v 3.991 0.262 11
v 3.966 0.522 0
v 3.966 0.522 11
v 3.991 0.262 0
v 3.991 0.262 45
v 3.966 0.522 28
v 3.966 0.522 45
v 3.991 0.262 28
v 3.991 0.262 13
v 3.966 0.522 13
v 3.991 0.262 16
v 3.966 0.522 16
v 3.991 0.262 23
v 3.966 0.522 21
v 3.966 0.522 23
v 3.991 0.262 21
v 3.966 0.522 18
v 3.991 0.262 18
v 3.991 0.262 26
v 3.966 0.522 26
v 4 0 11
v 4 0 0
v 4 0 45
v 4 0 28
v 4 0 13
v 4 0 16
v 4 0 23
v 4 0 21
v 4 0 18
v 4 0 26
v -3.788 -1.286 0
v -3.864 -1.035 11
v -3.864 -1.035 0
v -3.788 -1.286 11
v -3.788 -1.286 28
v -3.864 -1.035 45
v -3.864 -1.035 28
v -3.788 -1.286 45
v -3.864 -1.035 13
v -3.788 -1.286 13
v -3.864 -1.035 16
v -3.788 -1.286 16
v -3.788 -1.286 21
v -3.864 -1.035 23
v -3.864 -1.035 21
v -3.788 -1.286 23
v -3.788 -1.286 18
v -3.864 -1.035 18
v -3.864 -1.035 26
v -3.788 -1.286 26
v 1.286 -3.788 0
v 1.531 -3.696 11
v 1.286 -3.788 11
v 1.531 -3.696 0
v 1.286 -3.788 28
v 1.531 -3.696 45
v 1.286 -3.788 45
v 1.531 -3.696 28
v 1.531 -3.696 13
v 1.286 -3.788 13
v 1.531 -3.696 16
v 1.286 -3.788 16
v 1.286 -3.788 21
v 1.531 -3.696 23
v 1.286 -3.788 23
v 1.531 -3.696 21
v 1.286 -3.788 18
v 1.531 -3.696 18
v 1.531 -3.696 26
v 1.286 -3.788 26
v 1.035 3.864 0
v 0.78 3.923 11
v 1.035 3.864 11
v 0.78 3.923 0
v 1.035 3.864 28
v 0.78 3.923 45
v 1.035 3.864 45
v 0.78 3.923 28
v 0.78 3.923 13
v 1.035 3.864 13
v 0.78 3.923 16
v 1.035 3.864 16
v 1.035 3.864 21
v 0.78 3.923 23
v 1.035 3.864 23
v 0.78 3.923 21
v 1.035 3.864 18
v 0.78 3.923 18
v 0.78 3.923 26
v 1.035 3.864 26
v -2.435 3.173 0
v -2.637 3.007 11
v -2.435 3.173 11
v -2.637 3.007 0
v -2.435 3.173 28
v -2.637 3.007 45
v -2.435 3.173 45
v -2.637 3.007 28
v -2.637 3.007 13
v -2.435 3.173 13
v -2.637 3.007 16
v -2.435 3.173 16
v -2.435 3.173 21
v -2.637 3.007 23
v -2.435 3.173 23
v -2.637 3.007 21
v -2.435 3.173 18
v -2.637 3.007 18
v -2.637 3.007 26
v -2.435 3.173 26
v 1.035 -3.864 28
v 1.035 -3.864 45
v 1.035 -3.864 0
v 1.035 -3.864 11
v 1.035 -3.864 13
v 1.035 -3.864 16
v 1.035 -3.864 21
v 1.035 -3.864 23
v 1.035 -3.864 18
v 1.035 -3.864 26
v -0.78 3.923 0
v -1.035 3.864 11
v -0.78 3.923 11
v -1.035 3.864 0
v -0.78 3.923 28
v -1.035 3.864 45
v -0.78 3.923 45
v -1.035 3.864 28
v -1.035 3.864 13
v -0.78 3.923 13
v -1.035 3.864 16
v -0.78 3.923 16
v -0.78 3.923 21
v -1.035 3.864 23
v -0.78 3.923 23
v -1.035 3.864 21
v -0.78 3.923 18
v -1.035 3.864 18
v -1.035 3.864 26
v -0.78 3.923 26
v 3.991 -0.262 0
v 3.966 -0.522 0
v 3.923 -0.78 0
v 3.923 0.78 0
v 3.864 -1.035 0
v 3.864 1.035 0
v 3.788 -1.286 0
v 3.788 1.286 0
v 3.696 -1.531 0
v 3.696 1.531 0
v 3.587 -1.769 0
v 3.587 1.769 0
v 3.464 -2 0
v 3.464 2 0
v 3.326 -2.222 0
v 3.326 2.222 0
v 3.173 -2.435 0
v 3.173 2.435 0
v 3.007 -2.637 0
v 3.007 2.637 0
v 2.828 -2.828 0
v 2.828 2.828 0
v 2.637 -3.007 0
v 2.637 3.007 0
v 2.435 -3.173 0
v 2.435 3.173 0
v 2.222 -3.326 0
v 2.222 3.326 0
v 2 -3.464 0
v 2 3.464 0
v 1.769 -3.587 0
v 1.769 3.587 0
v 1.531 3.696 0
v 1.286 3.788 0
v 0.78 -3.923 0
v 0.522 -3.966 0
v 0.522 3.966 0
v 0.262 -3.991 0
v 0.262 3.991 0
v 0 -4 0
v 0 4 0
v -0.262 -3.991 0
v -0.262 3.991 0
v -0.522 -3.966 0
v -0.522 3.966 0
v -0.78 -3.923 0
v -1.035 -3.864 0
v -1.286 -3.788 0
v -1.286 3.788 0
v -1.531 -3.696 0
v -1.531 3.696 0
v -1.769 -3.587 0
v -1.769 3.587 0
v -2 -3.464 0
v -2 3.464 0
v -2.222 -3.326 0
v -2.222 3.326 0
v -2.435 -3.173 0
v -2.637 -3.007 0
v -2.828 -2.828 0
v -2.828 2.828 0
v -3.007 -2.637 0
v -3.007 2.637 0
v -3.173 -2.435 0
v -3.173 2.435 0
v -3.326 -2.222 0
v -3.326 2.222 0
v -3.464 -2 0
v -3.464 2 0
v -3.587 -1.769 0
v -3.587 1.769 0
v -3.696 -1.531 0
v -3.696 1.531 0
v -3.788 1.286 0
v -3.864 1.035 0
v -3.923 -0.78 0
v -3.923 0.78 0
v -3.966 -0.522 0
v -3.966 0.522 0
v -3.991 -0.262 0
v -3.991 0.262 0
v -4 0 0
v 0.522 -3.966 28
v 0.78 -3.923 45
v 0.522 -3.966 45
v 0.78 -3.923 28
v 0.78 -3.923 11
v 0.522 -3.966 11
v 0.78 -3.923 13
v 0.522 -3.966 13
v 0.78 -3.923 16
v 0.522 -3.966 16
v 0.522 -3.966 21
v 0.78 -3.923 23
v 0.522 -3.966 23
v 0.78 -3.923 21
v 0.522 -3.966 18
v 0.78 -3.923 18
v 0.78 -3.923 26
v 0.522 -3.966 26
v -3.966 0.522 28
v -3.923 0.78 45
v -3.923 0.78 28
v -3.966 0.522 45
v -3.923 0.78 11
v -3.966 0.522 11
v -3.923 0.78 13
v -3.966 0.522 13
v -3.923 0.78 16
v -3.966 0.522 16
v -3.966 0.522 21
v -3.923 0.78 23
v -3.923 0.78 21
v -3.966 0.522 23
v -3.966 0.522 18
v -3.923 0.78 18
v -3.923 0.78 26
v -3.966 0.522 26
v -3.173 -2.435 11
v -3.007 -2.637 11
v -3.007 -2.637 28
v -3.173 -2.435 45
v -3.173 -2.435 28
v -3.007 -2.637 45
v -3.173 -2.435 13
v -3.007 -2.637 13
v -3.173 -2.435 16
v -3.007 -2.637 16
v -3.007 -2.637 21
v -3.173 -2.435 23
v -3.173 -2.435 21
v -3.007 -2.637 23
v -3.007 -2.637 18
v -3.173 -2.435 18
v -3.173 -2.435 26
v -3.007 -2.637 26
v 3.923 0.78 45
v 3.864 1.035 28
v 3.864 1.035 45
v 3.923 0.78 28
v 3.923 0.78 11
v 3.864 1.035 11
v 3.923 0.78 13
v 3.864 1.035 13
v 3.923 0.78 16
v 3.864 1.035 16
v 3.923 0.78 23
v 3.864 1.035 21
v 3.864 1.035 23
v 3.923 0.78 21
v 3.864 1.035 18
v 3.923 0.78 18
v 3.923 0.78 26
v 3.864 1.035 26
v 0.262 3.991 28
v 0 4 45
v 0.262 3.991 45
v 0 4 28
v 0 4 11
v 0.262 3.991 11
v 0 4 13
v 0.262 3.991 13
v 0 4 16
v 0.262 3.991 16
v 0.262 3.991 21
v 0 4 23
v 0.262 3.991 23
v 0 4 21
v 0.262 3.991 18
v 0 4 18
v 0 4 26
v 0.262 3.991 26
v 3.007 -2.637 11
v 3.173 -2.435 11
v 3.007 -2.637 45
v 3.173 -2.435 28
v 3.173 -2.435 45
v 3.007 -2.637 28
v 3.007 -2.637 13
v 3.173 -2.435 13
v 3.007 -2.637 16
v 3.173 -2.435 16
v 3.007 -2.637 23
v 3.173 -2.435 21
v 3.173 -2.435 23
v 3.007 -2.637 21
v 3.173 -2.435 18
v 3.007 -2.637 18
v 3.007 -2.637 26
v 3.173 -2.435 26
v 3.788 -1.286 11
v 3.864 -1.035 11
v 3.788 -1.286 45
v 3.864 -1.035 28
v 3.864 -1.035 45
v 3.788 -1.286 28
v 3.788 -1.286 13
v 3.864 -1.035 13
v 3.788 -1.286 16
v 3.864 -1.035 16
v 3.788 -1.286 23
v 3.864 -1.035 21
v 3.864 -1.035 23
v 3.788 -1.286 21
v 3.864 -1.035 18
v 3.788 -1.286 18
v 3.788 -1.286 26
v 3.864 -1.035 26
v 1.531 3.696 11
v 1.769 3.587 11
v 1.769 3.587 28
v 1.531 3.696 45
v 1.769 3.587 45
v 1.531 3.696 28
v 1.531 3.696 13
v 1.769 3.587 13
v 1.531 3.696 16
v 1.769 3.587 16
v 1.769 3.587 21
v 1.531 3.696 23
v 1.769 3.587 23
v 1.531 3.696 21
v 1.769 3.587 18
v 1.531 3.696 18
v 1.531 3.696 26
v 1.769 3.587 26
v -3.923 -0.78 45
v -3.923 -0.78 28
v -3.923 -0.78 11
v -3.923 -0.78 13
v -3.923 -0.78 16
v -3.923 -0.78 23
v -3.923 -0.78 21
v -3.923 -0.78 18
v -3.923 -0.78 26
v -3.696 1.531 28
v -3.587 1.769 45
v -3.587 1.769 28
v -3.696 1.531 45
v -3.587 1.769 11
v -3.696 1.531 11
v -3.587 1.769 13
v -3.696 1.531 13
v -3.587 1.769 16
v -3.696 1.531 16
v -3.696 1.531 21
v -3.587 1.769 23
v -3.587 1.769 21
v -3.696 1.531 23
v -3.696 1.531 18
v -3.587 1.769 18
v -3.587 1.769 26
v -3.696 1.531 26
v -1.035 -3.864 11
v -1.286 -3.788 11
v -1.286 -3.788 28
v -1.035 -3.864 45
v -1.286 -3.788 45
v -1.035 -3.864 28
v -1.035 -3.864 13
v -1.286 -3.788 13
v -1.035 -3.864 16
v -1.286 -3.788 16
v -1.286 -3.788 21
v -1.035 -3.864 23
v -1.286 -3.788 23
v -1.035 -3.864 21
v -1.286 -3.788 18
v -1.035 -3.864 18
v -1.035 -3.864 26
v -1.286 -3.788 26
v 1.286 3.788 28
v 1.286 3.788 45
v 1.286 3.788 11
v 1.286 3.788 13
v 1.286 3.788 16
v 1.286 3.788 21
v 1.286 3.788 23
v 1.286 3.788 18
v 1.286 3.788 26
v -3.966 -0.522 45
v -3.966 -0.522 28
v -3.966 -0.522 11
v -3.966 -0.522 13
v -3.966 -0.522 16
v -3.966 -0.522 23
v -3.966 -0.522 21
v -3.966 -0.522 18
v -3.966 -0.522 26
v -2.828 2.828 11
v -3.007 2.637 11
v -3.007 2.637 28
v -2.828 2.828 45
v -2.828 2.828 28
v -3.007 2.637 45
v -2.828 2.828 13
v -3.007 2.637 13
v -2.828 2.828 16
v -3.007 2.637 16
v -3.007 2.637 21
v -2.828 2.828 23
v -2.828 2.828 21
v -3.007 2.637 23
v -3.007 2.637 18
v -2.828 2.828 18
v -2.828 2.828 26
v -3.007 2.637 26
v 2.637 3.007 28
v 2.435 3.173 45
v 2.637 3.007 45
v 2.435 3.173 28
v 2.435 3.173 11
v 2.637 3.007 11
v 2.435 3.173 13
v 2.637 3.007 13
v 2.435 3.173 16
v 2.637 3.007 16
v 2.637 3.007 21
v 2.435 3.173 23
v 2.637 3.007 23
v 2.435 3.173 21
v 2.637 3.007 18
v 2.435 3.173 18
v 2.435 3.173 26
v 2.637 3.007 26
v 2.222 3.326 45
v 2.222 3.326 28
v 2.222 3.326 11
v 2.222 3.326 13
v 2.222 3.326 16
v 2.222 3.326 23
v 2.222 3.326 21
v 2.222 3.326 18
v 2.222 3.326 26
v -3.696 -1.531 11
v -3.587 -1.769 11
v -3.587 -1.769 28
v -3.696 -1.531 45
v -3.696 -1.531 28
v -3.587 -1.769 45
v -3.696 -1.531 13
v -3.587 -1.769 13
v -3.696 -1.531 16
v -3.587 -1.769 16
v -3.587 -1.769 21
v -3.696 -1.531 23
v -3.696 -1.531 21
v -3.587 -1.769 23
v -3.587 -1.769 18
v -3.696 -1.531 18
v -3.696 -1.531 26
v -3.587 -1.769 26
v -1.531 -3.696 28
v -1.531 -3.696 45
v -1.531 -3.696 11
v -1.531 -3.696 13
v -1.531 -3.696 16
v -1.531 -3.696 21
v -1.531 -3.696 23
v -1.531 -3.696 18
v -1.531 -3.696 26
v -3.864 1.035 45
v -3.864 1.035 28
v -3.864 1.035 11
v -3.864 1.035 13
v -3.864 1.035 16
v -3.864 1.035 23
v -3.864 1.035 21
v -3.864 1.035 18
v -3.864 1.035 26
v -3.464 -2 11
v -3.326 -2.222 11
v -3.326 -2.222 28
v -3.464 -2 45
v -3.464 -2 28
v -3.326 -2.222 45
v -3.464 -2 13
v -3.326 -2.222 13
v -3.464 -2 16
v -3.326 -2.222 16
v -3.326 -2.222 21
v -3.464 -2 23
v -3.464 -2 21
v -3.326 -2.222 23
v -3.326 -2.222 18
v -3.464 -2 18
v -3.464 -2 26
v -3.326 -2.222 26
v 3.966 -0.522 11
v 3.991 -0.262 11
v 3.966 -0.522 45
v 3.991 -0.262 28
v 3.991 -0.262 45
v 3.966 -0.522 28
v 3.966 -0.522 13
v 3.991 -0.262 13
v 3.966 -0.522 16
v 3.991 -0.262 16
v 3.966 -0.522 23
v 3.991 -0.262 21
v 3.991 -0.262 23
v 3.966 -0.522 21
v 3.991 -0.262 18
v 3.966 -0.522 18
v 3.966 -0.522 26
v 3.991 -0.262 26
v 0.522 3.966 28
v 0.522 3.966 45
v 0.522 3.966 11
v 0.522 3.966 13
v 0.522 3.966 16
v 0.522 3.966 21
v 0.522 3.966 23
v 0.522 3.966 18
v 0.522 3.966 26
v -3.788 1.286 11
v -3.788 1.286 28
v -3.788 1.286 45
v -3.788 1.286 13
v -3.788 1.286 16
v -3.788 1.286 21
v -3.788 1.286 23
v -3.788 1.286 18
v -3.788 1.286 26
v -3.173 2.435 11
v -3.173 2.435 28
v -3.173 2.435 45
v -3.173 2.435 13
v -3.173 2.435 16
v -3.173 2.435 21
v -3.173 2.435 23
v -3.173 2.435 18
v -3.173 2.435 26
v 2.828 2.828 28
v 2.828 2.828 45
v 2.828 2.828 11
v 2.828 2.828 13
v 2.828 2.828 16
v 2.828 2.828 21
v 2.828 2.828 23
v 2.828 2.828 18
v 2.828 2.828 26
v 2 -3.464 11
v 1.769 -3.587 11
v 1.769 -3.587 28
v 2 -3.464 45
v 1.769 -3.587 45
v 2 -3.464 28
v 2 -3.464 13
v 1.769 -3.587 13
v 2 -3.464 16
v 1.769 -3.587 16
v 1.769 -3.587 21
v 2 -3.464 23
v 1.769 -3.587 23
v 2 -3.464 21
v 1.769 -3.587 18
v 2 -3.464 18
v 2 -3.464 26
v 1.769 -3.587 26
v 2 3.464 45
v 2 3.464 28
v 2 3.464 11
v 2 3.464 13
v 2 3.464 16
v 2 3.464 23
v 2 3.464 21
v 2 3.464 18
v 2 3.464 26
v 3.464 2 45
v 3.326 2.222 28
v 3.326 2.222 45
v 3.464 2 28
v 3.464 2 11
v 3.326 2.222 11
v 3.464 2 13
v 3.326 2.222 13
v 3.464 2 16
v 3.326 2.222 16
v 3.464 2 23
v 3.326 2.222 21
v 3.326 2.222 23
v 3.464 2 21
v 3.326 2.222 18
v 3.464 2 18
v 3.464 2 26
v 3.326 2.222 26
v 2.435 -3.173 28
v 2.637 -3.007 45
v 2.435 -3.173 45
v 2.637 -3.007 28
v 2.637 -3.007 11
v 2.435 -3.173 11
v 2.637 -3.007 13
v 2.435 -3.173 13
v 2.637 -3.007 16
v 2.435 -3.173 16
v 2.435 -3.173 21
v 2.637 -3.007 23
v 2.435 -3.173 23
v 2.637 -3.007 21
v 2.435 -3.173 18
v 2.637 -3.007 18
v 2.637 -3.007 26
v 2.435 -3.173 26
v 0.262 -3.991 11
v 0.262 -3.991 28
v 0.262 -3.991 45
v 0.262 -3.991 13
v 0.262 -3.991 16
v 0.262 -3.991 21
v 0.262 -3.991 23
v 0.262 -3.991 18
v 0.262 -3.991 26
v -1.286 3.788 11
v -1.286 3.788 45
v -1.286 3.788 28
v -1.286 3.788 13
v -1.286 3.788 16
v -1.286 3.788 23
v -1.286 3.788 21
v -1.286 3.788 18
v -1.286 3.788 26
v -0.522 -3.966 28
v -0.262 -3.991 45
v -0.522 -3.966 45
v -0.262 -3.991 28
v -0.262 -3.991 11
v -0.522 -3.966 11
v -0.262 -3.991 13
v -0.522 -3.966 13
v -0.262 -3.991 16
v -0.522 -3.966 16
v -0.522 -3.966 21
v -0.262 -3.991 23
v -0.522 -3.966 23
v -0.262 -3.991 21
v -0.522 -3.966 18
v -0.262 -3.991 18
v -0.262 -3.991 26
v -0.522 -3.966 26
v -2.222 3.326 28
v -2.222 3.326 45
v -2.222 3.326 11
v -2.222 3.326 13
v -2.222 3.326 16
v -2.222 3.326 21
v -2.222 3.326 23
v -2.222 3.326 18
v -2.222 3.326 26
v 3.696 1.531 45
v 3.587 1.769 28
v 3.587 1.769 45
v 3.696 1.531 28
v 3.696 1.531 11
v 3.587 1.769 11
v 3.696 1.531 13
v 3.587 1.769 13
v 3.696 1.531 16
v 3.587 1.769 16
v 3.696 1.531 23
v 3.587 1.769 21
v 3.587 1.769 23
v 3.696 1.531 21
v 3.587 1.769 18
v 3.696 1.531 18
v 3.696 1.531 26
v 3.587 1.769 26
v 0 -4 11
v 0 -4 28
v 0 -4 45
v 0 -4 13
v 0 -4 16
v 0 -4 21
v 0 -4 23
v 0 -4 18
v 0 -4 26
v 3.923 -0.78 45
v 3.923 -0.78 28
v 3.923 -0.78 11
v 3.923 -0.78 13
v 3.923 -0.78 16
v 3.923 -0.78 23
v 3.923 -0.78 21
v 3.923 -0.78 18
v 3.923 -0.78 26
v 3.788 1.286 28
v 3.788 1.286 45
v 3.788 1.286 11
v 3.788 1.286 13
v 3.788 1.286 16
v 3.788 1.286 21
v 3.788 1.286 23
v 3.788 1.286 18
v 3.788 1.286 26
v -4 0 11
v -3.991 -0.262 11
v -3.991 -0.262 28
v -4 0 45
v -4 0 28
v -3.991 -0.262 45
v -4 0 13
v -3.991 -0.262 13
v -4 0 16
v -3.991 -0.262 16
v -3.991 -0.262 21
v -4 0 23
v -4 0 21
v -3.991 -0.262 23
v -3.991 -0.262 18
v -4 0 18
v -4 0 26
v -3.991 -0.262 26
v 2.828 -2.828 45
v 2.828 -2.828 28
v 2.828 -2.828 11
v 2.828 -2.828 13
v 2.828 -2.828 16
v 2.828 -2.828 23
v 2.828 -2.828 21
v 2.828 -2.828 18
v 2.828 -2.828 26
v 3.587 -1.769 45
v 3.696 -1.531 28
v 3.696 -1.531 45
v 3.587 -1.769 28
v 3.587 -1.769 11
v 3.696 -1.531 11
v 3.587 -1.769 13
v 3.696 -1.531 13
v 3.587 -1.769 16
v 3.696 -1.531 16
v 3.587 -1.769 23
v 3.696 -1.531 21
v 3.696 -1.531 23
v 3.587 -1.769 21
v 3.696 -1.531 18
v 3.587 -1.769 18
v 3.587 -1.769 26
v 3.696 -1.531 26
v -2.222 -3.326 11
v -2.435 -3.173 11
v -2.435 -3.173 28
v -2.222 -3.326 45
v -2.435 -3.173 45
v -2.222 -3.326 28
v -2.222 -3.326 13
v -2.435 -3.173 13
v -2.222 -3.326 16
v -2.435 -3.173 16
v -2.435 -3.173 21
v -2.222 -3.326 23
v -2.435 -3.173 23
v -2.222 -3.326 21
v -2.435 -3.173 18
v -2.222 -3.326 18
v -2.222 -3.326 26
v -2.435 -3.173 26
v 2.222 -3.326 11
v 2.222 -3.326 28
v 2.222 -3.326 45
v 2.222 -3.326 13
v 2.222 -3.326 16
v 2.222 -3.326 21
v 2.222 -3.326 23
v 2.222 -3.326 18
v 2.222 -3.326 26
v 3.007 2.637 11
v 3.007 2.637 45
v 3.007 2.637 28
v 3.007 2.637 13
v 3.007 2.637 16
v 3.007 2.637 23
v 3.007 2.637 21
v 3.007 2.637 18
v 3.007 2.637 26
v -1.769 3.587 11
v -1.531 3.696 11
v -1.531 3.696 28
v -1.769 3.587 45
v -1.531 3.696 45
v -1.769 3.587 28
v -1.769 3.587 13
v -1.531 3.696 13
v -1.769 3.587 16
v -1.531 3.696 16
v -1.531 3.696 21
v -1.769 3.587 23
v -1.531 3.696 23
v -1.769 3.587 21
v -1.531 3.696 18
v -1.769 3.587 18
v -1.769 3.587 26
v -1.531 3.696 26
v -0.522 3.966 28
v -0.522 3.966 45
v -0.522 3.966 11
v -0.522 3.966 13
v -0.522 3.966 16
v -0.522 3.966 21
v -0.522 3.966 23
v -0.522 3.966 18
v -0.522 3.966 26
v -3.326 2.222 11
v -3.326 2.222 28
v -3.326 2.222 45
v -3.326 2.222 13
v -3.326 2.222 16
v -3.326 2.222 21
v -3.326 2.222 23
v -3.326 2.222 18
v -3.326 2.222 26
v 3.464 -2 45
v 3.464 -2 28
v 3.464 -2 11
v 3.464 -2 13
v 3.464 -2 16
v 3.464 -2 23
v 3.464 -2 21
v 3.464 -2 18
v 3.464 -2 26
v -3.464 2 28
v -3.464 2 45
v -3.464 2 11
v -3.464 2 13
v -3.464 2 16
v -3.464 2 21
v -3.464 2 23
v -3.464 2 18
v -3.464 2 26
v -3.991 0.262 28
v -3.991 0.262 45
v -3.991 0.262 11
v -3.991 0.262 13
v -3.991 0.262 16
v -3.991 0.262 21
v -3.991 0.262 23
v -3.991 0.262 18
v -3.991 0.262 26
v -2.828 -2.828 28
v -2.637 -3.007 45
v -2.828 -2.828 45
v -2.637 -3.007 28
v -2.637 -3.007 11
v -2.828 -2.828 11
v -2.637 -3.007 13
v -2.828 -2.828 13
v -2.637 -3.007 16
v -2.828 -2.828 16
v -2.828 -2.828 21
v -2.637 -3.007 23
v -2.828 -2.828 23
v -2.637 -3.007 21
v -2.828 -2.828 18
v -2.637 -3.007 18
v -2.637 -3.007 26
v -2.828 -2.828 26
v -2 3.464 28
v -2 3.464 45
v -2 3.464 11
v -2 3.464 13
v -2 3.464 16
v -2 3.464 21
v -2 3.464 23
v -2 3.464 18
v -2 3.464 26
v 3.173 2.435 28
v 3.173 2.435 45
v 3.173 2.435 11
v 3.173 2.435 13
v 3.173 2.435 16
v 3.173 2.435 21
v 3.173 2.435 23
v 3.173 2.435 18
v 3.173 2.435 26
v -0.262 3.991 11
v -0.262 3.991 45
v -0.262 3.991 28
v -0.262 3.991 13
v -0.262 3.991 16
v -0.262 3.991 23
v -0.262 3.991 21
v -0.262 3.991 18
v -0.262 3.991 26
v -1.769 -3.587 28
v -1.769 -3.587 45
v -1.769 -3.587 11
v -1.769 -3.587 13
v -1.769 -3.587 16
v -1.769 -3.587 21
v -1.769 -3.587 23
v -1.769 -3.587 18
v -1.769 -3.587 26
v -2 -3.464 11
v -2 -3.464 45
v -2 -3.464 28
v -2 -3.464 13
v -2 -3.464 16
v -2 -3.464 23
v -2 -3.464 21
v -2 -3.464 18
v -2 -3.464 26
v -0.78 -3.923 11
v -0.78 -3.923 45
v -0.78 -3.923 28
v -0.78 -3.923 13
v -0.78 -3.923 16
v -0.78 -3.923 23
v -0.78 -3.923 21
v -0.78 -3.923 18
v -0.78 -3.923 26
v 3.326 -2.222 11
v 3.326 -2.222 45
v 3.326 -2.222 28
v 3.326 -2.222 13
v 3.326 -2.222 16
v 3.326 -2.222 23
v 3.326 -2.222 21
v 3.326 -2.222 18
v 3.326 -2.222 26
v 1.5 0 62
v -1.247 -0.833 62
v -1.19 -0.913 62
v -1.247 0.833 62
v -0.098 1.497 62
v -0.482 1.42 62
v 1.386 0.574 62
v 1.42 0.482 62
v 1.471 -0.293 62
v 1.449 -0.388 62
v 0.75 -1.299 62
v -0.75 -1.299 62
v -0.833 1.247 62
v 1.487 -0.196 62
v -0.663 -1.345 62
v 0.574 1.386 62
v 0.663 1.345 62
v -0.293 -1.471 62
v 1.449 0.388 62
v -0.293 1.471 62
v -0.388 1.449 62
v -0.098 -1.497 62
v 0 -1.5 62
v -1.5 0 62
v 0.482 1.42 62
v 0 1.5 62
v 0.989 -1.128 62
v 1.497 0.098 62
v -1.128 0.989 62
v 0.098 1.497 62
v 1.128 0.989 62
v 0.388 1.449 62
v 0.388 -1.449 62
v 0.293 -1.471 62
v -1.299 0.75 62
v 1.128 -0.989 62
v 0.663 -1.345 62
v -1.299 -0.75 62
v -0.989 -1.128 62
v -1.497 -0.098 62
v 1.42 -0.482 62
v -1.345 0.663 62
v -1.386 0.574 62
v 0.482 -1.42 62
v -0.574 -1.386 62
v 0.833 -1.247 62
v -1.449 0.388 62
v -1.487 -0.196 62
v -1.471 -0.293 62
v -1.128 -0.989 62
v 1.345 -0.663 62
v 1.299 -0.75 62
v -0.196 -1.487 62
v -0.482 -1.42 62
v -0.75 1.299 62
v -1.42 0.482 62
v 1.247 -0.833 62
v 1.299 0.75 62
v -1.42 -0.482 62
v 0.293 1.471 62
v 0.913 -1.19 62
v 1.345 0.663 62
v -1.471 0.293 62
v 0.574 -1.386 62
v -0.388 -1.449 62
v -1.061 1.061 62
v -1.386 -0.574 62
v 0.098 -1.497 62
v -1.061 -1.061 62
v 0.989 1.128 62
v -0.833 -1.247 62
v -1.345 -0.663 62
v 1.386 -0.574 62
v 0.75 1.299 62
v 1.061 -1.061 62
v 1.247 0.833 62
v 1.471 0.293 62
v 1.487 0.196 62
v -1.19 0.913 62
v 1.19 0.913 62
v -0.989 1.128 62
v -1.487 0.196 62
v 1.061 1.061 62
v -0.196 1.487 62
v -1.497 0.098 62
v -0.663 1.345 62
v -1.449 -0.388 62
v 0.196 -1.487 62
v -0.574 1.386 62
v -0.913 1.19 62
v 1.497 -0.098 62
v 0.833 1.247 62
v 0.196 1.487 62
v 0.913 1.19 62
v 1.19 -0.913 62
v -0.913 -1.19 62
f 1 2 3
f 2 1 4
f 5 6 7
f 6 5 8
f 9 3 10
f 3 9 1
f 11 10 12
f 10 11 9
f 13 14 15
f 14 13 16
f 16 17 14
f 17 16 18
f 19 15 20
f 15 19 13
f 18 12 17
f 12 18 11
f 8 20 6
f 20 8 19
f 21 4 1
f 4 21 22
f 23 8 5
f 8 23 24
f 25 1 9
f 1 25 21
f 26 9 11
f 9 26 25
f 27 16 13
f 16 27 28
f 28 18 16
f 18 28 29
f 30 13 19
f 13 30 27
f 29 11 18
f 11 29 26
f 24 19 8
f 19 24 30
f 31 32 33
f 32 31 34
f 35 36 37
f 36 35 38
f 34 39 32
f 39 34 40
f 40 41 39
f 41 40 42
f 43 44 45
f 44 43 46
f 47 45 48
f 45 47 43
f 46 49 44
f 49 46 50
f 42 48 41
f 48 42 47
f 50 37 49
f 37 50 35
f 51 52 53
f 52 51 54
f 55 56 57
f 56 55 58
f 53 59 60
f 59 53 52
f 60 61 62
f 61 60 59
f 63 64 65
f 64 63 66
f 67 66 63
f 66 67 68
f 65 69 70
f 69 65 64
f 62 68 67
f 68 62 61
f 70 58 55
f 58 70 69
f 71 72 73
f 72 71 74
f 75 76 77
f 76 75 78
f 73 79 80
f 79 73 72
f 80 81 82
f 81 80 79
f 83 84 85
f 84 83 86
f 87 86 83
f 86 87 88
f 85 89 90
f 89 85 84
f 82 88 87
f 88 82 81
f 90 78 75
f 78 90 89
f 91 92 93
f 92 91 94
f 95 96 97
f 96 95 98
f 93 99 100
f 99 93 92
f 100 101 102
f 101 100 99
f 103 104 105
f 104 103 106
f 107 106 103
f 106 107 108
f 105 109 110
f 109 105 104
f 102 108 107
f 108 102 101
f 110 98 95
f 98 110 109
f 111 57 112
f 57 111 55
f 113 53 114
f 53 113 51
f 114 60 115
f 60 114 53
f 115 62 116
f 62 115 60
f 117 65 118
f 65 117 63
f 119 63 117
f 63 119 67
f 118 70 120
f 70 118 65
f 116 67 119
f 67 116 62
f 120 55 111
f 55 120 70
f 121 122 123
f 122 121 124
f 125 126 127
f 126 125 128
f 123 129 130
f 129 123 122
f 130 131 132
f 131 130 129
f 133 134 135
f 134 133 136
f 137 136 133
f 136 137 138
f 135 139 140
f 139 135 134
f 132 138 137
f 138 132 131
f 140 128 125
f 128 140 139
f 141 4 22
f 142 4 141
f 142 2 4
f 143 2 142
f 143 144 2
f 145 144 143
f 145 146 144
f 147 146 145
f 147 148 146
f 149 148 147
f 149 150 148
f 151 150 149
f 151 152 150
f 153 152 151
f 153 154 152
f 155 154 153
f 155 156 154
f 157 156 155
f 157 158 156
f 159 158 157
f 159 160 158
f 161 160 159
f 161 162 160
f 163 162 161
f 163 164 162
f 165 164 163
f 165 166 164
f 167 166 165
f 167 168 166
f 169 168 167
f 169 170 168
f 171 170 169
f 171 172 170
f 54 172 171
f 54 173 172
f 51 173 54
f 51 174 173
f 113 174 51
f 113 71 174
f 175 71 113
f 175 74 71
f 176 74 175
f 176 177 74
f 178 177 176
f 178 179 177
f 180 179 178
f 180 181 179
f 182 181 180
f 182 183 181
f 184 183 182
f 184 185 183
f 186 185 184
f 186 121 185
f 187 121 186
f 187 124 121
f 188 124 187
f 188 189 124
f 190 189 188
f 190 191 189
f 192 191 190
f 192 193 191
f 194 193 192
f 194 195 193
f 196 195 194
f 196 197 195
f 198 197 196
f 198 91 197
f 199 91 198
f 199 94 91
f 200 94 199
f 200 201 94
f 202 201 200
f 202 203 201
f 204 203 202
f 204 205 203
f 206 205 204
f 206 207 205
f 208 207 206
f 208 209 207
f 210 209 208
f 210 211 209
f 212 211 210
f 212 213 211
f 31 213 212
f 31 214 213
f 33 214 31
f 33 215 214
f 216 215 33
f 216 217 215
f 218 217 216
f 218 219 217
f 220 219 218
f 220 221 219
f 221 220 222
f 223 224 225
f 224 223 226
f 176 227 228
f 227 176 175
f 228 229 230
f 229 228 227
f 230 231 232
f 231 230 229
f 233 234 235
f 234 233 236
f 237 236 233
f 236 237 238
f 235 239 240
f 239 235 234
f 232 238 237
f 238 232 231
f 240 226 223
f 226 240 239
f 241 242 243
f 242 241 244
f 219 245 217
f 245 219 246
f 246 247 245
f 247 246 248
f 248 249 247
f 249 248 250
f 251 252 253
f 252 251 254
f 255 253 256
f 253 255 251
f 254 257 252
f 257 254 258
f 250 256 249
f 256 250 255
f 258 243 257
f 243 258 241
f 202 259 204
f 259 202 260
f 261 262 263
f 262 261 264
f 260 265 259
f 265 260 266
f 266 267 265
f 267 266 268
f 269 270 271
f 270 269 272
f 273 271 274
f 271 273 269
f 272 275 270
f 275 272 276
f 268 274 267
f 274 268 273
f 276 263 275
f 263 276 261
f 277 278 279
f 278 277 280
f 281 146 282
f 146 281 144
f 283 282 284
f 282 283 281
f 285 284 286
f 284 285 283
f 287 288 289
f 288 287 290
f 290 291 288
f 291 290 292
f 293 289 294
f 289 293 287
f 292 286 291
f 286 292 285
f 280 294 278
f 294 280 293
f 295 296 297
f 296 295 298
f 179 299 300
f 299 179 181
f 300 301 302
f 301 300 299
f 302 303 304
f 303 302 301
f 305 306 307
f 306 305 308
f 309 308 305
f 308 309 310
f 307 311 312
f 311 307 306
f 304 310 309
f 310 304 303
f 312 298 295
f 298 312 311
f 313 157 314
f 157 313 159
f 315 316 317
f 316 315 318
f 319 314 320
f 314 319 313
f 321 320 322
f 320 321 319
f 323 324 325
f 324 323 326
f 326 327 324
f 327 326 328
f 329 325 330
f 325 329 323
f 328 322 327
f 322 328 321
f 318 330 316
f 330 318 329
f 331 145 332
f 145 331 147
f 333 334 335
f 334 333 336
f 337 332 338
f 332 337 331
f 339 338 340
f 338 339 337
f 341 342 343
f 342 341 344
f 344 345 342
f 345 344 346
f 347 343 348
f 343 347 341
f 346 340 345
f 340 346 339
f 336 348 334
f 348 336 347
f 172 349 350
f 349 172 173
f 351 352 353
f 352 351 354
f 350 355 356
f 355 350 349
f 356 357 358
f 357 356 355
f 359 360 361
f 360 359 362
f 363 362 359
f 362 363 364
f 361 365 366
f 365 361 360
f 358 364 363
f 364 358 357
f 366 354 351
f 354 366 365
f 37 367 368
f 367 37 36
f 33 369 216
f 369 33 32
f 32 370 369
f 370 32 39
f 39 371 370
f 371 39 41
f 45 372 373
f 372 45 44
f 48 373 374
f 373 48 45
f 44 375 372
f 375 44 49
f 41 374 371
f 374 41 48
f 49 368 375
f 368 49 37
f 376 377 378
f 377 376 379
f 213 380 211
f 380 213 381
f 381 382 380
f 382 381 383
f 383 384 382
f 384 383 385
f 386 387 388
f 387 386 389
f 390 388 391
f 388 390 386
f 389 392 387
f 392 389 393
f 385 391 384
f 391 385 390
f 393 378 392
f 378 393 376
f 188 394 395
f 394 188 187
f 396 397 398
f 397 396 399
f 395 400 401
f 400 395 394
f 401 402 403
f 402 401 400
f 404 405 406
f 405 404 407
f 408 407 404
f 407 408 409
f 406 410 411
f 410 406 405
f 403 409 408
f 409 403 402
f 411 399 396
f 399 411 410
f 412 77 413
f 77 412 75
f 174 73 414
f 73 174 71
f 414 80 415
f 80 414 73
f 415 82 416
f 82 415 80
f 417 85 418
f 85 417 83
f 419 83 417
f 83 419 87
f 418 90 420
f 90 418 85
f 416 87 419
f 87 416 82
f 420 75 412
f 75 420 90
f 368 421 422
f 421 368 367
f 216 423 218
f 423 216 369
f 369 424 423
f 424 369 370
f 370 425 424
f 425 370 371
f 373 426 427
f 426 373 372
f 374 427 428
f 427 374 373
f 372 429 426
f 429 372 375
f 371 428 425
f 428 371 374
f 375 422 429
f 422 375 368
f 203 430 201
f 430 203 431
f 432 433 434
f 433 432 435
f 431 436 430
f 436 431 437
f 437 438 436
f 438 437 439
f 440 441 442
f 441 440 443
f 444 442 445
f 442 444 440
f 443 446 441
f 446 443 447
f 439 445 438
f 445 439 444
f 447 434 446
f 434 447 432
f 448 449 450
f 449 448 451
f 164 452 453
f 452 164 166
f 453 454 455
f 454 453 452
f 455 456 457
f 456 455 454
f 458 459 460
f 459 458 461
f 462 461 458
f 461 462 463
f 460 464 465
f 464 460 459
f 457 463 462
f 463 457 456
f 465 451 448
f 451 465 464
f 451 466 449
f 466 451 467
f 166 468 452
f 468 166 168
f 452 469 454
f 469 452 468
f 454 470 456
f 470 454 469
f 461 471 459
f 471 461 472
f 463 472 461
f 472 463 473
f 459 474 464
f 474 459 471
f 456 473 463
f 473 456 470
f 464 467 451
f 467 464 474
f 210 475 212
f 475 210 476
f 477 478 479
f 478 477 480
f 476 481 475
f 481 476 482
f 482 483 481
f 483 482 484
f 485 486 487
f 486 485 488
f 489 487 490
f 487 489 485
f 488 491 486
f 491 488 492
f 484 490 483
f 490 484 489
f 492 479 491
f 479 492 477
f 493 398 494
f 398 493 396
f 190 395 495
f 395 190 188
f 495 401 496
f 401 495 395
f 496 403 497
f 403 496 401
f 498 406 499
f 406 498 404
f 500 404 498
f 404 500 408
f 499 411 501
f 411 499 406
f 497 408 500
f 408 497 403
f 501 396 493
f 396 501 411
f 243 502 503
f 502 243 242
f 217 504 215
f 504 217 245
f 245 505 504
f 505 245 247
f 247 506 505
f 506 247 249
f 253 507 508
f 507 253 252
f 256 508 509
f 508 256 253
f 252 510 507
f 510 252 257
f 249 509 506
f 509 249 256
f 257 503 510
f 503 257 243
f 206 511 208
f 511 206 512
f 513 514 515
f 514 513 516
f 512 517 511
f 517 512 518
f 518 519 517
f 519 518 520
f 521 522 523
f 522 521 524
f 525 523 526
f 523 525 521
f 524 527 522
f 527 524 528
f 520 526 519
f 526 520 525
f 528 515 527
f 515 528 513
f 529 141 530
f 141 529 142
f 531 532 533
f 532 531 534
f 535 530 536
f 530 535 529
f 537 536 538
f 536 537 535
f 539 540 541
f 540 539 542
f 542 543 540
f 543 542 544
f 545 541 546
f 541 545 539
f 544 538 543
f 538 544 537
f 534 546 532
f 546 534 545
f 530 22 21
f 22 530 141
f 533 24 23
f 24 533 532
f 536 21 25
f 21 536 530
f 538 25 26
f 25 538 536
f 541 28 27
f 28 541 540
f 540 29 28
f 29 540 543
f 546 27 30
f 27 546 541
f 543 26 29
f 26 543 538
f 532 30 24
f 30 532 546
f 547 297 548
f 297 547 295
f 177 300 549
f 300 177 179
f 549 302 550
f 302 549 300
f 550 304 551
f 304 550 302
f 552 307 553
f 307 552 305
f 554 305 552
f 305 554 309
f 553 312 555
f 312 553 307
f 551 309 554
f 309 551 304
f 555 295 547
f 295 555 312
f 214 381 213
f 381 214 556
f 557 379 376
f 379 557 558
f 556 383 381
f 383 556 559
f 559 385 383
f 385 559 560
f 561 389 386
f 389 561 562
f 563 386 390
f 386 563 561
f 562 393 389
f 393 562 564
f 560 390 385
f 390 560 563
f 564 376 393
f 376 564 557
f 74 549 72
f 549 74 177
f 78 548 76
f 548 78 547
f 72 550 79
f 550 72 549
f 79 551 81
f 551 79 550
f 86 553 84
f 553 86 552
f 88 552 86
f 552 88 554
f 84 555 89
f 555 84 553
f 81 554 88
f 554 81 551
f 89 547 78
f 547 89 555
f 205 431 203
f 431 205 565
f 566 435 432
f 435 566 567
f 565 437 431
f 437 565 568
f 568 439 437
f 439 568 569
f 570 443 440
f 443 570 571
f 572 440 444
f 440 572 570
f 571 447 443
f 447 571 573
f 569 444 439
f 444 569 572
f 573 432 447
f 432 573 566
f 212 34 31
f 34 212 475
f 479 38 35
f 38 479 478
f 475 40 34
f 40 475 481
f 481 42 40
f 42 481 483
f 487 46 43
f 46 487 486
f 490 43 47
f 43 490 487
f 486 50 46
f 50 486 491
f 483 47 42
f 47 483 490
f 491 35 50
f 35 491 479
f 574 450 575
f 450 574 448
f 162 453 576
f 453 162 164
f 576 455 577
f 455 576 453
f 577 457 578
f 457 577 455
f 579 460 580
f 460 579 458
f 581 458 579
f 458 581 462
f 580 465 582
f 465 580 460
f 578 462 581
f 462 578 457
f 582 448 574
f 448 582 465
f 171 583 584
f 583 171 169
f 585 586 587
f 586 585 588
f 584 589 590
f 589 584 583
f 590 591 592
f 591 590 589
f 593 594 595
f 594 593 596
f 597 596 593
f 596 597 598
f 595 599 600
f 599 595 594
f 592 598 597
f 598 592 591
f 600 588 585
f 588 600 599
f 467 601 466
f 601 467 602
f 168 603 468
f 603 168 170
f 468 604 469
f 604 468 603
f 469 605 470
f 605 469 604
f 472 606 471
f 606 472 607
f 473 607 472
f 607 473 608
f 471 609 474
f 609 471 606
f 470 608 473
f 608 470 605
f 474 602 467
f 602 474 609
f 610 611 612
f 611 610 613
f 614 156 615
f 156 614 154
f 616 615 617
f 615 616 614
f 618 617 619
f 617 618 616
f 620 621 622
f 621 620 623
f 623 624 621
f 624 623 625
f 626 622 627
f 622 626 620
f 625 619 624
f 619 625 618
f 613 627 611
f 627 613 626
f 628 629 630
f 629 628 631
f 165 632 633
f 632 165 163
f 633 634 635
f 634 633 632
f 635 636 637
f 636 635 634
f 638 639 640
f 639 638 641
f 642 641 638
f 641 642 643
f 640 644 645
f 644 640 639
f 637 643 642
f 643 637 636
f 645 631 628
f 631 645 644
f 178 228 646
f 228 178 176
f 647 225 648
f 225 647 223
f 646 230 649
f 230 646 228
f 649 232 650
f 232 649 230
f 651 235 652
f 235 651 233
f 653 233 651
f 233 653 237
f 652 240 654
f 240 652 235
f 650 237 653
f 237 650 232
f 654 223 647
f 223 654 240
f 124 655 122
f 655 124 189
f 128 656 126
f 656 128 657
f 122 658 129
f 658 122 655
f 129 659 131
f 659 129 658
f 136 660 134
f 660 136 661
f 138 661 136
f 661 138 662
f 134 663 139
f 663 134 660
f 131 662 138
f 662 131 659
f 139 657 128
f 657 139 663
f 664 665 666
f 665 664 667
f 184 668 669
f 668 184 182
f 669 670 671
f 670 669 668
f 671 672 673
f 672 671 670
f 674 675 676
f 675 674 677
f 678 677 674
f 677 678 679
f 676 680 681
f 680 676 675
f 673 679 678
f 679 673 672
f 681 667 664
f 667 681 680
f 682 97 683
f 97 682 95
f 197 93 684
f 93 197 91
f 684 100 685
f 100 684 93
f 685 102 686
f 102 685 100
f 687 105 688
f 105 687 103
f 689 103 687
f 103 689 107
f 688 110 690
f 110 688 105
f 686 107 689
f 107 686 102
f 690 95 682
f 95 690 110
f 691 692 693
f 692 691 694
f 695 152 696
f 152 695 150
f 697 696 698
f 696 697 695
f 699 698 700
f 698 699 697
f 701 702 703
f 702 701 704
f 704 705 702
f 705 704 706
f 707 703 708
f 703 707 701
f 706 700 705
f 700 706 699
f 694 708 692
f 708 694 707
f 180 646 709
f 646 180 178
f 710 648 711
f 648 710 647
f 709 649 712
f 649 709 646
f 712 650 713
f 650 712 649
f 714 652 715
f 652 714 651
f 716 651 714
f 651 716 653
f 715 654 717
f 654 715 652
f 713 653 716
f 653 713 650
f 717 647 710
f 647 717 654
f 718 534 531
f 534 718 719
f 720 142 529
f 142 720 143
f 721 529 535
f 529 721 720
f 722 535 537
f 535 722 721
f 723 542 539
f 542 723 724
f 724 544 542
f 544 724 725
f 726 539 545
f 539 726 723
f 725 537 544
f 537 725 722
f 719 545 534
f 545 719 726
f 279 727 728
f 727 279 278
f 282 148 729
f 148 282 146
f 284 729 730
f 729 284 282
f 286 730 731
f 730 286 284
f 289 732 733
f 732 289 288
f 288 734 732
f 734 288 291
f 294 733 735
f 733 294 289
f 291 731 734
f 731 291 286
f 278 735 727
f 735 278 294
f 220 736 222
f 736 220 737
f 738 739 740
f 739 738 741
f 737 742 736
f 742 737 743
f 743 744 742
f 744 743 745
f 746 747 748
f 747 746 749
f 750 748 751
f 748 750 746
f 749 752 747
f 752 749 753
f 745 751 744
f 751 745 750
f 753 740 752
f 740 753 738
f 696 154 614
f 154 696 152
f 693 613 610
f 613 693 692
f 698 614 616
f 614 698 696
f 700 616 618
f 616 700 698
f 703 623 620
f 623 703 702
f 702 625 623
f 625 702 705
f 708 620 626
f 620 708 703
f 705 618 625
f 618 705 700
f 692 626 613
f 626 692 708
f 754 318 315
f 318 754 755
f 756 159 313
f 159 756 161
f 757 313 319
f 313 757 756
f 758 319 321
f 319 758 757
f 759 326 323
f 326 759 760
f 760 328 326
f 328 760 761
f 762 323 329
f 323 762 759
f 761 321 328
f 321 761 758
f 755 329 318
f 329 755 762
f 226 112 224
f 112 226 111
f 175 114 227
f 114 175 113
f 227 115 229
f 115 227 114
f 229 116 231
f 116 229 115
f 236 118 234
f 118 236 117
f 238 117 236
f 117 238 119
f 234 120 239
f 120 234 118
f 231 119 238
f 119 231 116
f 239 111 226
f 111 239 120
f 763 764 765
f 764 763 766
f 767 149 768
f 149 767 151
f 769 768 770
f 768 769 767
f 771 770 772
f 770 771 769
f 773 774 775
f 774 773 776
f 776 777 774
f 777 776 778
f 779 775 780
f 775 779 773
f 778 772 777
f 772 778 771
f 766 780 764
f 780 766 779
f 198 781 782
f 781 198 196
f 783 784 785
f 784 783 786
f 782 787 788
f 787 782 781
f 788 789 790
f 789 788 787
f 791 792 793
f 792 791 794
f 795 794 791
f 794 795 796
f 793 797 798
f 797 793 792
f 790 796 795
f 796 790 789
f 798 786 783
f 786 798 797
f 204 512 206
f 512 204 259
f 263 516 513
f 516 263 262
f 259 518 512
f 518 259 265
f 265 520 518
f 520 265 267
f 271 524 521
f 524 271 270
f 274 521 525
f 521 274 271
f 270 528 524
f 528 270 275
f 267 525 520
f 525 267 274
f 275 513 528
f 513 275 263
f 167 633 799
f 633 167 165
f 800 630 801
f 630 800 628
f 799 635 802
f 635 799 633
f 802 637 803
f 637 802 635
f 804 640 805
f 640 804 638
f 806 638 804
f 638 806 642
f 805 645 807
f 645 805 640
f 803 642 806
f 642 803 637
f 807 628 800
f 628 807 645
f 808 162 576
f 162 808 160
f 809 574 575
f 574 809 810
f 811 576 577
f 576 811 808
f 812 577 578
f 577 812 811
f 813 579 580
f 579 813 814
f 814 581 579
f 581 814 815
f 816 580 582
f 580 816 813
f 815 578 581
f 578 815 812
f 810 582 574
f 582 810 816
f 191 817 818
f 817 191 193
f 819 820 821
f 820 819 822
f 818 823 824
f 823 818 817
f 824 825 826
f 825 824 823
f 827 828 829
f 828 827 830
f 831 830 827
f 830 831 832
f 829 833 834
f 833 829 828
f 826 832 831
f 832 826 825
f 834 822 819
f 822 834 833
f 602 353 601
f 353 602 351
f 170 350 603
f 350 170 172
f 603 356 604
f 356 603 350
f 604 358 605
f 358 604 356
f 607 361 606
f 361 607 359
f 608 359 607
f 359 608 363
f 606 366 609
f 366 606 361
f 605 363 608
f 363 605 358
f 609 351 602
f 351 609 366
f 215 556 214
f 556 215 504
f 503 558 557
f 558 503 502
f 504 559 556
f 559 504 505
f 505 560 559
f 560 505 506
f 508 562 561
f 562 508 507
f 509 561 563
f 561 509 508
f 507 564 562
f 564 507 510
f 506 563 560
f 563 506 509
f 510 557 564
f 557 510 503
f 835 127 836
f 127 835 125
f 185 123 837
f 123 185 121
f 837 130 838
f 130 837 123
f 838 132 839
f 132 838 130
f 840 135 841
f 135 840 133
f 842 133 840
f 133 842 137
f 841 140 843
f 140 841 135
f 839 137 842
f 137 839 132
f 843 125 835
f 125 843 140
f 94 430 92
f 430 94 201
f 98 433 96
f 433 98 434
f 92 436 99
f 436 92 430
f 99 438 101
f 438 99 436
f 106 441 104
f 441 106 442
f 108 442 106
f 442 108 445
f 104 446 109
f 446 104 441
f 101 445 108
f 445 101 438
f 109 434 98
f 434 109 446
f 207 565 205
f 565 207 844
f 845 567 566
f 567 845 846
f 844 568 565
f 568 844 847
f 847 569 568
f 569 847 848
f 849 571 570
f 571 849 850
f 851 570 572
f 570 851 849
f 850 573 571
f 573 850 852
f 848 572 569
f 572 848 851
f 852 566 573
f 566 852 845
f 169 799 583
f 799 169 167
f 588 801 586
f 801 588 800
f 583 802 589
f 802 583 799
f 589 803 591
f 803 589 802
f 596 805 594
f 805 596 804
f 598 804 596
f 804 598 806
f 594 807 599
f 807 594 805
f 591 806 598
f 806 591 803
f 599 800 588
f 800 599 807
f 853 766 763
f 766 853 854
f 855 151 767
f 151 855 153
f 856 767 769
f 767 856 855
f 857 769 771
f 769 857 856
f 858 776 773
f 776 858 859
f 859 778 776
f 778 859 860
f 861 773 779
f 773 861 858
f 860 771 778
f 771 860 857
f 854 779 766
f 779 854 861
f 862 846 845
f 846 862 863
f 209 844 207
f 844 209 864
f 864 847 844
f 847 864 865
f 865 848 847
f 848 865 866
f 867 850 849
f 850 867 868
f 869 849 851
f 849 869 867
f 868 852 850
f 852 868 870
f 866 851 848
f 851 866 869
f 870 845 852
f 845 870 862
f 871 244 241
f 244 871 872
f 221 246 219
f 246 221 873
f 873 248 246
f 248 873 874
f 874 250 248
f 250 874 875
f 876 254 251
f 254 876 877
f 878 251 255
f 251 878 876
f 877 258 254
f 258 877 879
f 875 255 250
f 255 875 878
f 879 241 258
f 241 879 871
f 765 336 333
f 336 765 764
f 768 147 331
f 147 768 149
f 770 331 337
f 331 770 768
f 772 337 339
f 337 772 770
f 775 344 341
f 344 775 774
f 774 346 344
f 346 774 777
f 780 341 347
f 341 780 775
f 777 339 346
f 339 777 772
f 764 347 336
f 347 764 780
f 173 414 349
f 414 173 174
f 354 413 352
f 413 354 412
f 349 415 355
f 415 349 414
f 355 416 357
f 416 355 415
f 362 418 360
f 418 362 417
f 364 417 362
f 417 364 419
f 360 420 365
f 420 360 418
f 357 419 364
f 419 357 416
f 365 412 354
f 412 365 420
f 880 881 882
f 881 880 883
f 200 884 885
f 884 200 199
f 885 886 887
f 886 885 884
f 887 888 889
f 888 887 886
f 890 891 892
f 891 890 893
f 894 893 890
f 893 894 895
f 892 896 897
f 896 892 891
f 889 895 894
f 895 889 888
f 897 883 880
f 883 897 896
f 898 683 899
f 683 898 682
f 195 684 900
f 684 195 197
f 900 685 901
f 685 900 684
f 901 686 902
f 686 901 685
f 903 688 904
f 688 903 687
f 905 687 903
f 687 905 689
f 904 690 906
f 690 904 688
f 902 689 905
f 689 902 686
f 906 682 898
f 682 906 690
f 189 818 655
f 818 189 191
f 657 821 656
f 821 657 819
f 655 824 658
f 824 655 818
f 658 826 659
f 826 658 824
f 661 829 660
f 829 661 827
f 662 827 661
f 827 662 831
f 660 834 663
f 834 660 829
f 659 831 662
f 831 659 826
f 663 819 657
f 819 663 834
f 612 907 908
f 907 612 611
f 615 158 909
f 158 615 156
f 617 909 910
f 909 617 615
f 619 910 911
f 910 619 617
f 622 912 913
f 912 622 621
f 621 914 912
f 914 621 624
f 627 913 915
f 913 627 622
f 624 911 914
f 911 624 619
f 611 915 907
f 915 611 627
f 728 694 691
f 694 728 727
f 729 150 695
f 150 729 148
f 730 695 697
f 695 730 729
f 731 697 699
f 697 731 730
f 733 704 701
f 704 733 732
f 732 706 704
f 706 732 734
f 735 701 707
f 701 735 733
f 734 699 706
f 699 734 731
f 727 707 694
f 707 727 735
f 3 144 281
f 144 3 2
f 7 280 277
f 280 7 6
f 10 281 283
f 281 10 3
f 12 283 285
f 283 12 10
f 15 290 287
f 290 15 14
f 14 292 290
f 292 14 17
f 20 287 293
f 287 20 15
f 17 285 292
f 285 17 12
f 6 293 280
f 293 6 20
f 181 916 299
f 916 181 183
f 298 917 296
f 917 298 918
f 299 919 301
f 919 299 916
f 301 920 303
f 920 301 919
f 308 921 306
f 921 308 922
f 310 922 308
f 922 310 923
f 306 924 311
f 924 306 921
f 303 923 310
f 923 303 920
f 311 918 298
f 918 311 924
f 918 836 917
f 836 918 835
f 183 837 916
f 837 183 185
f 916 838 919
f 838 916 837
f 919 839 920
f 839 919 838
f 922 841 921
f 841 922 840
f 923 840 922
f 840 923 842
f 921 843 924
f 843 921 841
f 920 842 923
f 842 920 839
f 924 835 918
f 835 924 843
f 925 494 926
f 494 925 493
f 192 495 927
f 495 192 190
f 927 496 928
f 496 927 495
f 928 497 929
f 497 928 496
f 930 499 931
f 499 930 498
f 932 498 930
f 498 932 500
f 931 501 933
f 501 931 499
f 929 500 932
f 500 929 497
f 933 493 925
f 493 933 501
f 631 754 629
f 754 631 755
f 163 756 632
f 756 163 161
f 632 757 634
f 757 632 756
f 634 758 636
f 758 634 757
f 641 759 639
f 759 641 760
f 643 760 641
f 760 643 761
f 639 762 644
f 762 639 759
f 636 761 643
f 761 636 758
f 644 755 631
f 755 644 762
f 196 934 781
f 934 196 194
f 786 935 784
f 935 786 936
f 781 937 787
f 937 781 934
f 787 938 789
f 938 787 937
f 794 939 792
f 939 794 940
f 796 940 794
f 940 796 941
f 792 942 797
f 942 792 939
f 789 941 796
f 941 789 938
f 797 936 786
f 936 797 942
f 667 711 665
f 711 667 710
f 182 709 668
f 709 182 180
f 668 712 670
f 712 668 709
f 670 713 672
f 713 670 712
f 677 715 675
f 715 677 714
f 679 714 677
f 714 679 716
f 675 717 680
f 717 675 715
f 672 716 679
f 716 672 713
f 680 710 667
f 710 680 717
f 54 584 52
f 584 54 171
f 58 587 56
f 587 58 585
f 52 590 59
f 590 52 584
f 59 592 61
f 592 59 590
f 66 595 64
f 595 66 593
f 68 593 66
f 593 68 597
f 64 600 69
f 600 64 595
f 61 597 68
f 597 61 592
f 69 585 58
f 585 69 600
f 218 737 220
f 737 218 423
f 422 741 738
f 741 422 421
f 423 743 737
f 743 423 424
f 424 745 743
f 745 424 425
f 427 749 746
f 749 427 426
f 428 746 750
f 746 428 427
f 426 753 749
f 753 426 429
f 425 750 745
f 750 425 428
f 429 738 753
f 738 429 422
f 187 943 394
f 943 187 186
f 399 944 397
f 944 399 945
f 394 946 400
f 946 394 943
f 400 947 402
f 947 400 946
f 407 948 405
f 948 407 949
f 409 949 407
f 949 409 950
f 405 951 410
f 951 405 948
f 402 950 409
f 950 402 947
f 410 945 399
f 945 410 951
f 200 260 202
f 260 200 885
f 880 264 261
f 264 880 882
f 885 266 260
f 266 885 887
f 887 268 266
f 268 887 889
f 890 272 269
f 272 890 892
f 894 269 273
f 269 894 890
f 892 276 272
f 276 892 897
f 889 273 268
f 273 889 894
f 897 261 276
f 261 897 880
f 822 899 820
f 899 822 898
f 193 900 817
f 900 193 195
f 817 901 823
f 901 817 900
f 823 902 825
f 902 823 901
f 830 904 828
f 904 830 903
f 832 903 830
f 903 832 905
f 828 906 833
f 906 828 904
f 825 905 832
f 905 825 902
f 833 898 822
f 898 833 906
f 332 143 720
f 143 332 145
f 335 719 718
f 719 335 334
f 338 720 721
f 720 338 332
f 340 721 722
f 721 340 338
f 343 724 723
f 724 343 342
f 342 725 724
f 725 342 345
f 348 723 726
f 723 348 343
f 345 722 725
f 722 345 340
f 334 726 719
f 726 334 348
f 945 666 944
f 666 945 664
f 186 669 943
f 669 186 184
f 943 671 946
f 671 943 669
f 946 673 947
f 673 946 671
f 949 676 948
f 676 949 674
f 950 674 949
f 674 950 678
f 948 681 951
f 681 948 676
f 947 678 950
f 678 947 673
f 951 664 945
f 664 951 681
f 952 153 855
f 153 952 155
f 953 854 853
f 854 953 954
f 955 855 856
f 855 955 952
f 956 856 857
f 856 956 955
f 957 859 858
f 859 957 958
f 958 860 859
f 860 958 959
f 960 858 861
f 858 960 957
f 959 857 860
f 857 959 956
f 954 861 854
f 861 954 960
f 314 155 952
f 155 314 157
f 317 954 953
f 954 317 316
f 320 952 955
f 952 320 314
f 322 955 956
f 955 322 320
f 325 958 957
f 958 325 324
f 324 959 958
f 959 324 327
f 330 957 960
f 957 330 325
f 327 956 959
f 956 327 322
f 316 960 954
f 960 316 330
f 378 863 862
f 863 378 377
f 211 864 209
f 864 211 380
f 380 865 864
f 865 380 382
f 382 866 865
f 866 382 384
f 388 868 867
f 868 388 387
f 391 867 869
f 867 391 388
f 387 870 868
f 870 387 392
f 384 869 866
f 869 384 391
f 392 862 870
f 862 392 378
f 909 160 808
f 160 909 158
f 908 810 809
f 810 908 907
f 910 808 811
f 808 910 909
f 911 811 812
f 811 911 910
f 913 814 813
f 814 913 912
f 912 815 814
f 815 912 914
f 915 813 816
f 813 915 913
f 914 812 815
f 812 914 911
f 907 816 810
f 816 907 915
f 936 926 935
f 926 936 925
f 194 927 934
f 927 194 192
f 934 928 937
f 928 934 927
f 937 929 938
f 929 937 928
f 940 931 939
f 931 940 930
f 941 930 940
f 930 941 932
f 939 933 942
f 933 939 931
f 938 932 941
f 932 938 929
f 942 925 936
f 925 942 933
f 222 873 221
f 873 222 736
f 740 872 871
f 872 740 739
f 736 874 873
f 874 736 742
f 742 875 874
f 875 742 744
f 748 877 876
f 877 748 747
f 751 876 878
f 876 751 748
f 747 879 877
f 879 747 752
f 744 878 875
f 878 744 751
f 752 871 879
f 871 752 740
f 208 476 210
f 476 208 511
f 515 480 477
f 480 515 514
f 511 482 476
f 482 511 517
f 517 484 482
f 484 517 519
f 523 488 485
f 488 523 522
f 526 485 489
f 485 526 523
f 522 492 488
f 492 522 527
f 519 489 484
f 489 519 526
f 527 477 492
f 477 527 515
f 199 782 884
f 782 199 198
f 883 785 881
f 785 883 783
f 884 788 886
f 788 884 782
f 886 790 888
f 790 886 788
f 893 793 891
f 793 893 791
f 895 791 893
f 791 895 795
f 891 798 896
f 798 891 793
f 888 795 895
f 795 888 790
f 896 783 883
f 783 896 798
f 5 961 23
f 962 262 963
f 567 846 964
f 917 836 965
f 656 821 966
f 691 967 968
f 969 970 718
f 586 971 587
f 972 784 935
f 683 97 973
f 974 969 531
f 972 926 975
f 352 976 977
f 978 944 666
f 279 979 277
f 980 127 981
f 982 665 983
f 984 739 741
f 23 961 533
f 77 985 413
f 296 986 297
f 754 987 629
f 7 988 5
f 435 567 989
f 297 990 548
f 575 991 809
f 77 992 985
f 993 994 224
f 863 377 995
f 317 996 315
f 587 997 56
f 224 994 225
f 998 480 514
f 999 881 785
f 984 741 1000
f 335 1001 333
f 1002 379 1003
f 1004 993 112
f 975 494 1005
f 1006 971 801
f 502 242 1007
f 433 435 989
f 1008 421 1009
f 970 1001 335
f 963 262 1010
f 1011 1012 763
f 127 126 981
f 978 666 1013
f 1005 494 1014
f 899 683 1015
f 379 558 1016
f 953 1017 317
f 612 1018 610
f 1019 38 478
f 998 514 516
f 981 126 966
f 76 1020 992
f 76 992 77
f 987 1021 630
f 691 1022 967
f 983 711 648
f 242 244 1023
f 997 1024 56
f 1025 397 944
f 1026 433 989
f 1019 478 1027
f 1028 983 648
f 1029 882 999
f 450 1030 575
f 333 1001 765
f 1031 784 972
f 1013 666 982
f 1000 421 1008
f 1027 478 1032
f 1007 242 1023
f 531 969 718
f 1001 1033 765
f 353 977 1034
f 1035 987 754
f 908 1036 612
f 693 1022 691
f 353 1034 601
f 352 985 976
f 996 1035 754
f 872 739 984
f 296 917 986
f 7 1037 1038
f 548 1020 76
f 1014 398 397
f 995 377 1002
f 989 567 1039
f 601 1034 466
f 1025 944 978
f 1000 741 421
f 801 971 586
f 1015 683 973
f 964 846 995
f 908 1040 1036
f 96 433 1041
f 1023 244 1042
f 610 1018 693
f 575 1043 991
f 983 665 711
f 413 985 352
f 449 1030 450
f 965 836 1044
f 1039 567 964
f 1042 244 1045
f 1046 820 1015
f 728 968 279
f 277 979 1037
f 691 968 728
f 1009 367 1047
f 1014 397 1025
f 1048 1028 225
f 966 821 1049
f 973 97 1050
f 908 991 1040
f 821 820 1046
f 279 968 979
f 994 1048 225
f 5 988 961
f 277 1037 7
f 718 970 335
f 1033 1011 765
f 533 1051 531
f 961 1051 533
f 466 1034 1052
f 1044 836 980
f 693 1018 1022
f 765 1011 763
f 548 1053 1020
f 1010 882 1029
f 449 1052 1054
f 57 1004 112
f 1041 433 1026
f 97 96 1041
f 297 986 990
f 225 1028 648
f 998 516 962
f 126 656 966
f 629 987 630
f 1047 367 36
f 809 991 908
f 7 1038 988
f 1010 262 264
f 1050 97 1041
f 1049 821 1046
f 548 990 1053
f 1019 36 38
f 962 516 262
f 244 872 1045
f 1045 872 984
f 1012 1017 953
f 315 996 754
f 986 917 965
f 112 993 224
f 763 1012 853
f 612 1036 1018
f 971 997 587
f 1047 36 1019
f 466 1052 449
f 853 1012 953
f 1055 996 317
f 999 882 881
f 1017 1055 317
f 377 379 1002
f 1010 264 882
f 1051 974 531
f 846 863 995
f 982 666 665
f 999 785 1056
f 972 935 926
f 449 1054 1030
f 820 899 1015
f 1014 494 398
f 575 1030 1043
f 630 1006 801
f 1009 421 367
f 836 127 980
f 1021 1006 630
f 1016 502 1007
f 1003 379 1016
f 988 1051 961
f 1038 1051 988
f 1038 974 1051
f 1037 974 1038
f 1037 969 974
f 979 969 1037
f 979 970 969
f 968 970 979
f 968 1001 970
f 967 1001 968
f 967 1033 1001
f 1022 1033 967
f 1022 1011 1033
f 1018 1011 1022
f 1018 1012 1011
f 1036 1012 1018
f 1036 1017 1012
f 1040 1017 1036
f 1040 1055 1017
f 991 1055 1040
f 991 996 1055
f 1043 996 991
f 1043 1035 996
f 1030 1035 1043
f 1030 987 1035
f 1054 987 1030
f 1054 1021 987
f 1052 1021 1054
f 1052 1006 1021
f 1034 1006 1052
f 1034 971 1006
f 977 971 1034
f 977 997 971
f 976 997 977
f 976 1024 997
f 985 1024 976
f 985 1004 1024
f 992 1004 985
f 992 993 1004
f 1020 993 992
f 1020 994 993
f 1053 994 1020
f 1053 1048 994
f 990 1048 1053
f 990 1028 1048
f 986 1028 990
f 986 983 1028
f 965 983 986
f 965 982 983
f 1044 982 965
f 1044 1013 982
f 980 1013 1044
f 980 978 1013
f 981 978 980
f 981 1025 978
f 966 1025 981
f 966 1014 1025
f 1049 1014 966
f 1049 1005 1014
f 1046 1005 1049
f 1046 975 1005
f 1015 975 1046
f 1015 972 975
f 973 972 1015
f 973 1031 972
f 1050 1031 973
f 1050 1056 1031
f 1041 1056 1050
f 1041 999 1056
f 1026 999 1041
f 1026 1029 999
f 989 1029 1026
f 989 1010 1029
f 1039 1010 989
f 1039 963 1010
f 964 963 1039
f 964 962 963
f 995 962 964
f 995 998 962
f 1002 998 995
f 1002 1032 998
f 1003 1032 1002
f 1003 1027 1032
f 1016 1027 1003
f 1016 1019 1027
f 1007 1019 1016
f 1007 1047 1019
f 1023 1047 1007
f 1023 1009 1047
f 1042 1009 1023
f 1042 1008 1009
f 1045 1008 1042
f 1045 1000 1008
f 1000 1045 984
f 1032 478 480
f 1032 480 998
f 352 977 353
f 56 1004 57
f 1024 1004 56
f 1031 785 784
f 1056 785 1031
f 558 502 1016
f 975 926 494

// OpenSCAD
// Pestle for grinding tissue in a 1.5 mL microcentrifuge tube
// Printed upright: handle at the bottom, tip pointing up.

$fn = 96;

// ---- Dimensions (mm) ----
handle_d      = 8;    // handle diameter
handle_top_z  = 45;   // handle height / cone start
tip_min_d     = 3;    // cone tip diameter / sphere diameter
tip_centre_z  = 62;   // sphere centre height
groove_count  = 4;    // number of circumferential grooves
groove_w      = 2;    // groove width (Z)
groove_d      = 1;    // groove depth from outer surface
groove_zs     = [10, 15, 20, 25]; // groove centre heights

eps           = 0.5;  // cutter overshoot

difference() {
    union() {
        // Handle
        cylinder(d = handle_d, h = handle_top_z);
        // Cone
        translate([0, 0, handle_top_z])
            cylinder(d1 = handle_d, d2 = tip_min_d, h = tip_centre_z - handle_top_z);
        // Rounded tip
        translate([0, 0, tip_centre_z - 1.5])
            sphere(d = tip_min_d);
    }

    // Grip grooves
    for (z = groove_zs)
        translate([0, 0, z - groove_w / 2])
            rotate_extrude()
                translate([handle_d / 2, groove_w, 0])
                    square([handle_d / 2 - groove_d, groove_w]);
}
